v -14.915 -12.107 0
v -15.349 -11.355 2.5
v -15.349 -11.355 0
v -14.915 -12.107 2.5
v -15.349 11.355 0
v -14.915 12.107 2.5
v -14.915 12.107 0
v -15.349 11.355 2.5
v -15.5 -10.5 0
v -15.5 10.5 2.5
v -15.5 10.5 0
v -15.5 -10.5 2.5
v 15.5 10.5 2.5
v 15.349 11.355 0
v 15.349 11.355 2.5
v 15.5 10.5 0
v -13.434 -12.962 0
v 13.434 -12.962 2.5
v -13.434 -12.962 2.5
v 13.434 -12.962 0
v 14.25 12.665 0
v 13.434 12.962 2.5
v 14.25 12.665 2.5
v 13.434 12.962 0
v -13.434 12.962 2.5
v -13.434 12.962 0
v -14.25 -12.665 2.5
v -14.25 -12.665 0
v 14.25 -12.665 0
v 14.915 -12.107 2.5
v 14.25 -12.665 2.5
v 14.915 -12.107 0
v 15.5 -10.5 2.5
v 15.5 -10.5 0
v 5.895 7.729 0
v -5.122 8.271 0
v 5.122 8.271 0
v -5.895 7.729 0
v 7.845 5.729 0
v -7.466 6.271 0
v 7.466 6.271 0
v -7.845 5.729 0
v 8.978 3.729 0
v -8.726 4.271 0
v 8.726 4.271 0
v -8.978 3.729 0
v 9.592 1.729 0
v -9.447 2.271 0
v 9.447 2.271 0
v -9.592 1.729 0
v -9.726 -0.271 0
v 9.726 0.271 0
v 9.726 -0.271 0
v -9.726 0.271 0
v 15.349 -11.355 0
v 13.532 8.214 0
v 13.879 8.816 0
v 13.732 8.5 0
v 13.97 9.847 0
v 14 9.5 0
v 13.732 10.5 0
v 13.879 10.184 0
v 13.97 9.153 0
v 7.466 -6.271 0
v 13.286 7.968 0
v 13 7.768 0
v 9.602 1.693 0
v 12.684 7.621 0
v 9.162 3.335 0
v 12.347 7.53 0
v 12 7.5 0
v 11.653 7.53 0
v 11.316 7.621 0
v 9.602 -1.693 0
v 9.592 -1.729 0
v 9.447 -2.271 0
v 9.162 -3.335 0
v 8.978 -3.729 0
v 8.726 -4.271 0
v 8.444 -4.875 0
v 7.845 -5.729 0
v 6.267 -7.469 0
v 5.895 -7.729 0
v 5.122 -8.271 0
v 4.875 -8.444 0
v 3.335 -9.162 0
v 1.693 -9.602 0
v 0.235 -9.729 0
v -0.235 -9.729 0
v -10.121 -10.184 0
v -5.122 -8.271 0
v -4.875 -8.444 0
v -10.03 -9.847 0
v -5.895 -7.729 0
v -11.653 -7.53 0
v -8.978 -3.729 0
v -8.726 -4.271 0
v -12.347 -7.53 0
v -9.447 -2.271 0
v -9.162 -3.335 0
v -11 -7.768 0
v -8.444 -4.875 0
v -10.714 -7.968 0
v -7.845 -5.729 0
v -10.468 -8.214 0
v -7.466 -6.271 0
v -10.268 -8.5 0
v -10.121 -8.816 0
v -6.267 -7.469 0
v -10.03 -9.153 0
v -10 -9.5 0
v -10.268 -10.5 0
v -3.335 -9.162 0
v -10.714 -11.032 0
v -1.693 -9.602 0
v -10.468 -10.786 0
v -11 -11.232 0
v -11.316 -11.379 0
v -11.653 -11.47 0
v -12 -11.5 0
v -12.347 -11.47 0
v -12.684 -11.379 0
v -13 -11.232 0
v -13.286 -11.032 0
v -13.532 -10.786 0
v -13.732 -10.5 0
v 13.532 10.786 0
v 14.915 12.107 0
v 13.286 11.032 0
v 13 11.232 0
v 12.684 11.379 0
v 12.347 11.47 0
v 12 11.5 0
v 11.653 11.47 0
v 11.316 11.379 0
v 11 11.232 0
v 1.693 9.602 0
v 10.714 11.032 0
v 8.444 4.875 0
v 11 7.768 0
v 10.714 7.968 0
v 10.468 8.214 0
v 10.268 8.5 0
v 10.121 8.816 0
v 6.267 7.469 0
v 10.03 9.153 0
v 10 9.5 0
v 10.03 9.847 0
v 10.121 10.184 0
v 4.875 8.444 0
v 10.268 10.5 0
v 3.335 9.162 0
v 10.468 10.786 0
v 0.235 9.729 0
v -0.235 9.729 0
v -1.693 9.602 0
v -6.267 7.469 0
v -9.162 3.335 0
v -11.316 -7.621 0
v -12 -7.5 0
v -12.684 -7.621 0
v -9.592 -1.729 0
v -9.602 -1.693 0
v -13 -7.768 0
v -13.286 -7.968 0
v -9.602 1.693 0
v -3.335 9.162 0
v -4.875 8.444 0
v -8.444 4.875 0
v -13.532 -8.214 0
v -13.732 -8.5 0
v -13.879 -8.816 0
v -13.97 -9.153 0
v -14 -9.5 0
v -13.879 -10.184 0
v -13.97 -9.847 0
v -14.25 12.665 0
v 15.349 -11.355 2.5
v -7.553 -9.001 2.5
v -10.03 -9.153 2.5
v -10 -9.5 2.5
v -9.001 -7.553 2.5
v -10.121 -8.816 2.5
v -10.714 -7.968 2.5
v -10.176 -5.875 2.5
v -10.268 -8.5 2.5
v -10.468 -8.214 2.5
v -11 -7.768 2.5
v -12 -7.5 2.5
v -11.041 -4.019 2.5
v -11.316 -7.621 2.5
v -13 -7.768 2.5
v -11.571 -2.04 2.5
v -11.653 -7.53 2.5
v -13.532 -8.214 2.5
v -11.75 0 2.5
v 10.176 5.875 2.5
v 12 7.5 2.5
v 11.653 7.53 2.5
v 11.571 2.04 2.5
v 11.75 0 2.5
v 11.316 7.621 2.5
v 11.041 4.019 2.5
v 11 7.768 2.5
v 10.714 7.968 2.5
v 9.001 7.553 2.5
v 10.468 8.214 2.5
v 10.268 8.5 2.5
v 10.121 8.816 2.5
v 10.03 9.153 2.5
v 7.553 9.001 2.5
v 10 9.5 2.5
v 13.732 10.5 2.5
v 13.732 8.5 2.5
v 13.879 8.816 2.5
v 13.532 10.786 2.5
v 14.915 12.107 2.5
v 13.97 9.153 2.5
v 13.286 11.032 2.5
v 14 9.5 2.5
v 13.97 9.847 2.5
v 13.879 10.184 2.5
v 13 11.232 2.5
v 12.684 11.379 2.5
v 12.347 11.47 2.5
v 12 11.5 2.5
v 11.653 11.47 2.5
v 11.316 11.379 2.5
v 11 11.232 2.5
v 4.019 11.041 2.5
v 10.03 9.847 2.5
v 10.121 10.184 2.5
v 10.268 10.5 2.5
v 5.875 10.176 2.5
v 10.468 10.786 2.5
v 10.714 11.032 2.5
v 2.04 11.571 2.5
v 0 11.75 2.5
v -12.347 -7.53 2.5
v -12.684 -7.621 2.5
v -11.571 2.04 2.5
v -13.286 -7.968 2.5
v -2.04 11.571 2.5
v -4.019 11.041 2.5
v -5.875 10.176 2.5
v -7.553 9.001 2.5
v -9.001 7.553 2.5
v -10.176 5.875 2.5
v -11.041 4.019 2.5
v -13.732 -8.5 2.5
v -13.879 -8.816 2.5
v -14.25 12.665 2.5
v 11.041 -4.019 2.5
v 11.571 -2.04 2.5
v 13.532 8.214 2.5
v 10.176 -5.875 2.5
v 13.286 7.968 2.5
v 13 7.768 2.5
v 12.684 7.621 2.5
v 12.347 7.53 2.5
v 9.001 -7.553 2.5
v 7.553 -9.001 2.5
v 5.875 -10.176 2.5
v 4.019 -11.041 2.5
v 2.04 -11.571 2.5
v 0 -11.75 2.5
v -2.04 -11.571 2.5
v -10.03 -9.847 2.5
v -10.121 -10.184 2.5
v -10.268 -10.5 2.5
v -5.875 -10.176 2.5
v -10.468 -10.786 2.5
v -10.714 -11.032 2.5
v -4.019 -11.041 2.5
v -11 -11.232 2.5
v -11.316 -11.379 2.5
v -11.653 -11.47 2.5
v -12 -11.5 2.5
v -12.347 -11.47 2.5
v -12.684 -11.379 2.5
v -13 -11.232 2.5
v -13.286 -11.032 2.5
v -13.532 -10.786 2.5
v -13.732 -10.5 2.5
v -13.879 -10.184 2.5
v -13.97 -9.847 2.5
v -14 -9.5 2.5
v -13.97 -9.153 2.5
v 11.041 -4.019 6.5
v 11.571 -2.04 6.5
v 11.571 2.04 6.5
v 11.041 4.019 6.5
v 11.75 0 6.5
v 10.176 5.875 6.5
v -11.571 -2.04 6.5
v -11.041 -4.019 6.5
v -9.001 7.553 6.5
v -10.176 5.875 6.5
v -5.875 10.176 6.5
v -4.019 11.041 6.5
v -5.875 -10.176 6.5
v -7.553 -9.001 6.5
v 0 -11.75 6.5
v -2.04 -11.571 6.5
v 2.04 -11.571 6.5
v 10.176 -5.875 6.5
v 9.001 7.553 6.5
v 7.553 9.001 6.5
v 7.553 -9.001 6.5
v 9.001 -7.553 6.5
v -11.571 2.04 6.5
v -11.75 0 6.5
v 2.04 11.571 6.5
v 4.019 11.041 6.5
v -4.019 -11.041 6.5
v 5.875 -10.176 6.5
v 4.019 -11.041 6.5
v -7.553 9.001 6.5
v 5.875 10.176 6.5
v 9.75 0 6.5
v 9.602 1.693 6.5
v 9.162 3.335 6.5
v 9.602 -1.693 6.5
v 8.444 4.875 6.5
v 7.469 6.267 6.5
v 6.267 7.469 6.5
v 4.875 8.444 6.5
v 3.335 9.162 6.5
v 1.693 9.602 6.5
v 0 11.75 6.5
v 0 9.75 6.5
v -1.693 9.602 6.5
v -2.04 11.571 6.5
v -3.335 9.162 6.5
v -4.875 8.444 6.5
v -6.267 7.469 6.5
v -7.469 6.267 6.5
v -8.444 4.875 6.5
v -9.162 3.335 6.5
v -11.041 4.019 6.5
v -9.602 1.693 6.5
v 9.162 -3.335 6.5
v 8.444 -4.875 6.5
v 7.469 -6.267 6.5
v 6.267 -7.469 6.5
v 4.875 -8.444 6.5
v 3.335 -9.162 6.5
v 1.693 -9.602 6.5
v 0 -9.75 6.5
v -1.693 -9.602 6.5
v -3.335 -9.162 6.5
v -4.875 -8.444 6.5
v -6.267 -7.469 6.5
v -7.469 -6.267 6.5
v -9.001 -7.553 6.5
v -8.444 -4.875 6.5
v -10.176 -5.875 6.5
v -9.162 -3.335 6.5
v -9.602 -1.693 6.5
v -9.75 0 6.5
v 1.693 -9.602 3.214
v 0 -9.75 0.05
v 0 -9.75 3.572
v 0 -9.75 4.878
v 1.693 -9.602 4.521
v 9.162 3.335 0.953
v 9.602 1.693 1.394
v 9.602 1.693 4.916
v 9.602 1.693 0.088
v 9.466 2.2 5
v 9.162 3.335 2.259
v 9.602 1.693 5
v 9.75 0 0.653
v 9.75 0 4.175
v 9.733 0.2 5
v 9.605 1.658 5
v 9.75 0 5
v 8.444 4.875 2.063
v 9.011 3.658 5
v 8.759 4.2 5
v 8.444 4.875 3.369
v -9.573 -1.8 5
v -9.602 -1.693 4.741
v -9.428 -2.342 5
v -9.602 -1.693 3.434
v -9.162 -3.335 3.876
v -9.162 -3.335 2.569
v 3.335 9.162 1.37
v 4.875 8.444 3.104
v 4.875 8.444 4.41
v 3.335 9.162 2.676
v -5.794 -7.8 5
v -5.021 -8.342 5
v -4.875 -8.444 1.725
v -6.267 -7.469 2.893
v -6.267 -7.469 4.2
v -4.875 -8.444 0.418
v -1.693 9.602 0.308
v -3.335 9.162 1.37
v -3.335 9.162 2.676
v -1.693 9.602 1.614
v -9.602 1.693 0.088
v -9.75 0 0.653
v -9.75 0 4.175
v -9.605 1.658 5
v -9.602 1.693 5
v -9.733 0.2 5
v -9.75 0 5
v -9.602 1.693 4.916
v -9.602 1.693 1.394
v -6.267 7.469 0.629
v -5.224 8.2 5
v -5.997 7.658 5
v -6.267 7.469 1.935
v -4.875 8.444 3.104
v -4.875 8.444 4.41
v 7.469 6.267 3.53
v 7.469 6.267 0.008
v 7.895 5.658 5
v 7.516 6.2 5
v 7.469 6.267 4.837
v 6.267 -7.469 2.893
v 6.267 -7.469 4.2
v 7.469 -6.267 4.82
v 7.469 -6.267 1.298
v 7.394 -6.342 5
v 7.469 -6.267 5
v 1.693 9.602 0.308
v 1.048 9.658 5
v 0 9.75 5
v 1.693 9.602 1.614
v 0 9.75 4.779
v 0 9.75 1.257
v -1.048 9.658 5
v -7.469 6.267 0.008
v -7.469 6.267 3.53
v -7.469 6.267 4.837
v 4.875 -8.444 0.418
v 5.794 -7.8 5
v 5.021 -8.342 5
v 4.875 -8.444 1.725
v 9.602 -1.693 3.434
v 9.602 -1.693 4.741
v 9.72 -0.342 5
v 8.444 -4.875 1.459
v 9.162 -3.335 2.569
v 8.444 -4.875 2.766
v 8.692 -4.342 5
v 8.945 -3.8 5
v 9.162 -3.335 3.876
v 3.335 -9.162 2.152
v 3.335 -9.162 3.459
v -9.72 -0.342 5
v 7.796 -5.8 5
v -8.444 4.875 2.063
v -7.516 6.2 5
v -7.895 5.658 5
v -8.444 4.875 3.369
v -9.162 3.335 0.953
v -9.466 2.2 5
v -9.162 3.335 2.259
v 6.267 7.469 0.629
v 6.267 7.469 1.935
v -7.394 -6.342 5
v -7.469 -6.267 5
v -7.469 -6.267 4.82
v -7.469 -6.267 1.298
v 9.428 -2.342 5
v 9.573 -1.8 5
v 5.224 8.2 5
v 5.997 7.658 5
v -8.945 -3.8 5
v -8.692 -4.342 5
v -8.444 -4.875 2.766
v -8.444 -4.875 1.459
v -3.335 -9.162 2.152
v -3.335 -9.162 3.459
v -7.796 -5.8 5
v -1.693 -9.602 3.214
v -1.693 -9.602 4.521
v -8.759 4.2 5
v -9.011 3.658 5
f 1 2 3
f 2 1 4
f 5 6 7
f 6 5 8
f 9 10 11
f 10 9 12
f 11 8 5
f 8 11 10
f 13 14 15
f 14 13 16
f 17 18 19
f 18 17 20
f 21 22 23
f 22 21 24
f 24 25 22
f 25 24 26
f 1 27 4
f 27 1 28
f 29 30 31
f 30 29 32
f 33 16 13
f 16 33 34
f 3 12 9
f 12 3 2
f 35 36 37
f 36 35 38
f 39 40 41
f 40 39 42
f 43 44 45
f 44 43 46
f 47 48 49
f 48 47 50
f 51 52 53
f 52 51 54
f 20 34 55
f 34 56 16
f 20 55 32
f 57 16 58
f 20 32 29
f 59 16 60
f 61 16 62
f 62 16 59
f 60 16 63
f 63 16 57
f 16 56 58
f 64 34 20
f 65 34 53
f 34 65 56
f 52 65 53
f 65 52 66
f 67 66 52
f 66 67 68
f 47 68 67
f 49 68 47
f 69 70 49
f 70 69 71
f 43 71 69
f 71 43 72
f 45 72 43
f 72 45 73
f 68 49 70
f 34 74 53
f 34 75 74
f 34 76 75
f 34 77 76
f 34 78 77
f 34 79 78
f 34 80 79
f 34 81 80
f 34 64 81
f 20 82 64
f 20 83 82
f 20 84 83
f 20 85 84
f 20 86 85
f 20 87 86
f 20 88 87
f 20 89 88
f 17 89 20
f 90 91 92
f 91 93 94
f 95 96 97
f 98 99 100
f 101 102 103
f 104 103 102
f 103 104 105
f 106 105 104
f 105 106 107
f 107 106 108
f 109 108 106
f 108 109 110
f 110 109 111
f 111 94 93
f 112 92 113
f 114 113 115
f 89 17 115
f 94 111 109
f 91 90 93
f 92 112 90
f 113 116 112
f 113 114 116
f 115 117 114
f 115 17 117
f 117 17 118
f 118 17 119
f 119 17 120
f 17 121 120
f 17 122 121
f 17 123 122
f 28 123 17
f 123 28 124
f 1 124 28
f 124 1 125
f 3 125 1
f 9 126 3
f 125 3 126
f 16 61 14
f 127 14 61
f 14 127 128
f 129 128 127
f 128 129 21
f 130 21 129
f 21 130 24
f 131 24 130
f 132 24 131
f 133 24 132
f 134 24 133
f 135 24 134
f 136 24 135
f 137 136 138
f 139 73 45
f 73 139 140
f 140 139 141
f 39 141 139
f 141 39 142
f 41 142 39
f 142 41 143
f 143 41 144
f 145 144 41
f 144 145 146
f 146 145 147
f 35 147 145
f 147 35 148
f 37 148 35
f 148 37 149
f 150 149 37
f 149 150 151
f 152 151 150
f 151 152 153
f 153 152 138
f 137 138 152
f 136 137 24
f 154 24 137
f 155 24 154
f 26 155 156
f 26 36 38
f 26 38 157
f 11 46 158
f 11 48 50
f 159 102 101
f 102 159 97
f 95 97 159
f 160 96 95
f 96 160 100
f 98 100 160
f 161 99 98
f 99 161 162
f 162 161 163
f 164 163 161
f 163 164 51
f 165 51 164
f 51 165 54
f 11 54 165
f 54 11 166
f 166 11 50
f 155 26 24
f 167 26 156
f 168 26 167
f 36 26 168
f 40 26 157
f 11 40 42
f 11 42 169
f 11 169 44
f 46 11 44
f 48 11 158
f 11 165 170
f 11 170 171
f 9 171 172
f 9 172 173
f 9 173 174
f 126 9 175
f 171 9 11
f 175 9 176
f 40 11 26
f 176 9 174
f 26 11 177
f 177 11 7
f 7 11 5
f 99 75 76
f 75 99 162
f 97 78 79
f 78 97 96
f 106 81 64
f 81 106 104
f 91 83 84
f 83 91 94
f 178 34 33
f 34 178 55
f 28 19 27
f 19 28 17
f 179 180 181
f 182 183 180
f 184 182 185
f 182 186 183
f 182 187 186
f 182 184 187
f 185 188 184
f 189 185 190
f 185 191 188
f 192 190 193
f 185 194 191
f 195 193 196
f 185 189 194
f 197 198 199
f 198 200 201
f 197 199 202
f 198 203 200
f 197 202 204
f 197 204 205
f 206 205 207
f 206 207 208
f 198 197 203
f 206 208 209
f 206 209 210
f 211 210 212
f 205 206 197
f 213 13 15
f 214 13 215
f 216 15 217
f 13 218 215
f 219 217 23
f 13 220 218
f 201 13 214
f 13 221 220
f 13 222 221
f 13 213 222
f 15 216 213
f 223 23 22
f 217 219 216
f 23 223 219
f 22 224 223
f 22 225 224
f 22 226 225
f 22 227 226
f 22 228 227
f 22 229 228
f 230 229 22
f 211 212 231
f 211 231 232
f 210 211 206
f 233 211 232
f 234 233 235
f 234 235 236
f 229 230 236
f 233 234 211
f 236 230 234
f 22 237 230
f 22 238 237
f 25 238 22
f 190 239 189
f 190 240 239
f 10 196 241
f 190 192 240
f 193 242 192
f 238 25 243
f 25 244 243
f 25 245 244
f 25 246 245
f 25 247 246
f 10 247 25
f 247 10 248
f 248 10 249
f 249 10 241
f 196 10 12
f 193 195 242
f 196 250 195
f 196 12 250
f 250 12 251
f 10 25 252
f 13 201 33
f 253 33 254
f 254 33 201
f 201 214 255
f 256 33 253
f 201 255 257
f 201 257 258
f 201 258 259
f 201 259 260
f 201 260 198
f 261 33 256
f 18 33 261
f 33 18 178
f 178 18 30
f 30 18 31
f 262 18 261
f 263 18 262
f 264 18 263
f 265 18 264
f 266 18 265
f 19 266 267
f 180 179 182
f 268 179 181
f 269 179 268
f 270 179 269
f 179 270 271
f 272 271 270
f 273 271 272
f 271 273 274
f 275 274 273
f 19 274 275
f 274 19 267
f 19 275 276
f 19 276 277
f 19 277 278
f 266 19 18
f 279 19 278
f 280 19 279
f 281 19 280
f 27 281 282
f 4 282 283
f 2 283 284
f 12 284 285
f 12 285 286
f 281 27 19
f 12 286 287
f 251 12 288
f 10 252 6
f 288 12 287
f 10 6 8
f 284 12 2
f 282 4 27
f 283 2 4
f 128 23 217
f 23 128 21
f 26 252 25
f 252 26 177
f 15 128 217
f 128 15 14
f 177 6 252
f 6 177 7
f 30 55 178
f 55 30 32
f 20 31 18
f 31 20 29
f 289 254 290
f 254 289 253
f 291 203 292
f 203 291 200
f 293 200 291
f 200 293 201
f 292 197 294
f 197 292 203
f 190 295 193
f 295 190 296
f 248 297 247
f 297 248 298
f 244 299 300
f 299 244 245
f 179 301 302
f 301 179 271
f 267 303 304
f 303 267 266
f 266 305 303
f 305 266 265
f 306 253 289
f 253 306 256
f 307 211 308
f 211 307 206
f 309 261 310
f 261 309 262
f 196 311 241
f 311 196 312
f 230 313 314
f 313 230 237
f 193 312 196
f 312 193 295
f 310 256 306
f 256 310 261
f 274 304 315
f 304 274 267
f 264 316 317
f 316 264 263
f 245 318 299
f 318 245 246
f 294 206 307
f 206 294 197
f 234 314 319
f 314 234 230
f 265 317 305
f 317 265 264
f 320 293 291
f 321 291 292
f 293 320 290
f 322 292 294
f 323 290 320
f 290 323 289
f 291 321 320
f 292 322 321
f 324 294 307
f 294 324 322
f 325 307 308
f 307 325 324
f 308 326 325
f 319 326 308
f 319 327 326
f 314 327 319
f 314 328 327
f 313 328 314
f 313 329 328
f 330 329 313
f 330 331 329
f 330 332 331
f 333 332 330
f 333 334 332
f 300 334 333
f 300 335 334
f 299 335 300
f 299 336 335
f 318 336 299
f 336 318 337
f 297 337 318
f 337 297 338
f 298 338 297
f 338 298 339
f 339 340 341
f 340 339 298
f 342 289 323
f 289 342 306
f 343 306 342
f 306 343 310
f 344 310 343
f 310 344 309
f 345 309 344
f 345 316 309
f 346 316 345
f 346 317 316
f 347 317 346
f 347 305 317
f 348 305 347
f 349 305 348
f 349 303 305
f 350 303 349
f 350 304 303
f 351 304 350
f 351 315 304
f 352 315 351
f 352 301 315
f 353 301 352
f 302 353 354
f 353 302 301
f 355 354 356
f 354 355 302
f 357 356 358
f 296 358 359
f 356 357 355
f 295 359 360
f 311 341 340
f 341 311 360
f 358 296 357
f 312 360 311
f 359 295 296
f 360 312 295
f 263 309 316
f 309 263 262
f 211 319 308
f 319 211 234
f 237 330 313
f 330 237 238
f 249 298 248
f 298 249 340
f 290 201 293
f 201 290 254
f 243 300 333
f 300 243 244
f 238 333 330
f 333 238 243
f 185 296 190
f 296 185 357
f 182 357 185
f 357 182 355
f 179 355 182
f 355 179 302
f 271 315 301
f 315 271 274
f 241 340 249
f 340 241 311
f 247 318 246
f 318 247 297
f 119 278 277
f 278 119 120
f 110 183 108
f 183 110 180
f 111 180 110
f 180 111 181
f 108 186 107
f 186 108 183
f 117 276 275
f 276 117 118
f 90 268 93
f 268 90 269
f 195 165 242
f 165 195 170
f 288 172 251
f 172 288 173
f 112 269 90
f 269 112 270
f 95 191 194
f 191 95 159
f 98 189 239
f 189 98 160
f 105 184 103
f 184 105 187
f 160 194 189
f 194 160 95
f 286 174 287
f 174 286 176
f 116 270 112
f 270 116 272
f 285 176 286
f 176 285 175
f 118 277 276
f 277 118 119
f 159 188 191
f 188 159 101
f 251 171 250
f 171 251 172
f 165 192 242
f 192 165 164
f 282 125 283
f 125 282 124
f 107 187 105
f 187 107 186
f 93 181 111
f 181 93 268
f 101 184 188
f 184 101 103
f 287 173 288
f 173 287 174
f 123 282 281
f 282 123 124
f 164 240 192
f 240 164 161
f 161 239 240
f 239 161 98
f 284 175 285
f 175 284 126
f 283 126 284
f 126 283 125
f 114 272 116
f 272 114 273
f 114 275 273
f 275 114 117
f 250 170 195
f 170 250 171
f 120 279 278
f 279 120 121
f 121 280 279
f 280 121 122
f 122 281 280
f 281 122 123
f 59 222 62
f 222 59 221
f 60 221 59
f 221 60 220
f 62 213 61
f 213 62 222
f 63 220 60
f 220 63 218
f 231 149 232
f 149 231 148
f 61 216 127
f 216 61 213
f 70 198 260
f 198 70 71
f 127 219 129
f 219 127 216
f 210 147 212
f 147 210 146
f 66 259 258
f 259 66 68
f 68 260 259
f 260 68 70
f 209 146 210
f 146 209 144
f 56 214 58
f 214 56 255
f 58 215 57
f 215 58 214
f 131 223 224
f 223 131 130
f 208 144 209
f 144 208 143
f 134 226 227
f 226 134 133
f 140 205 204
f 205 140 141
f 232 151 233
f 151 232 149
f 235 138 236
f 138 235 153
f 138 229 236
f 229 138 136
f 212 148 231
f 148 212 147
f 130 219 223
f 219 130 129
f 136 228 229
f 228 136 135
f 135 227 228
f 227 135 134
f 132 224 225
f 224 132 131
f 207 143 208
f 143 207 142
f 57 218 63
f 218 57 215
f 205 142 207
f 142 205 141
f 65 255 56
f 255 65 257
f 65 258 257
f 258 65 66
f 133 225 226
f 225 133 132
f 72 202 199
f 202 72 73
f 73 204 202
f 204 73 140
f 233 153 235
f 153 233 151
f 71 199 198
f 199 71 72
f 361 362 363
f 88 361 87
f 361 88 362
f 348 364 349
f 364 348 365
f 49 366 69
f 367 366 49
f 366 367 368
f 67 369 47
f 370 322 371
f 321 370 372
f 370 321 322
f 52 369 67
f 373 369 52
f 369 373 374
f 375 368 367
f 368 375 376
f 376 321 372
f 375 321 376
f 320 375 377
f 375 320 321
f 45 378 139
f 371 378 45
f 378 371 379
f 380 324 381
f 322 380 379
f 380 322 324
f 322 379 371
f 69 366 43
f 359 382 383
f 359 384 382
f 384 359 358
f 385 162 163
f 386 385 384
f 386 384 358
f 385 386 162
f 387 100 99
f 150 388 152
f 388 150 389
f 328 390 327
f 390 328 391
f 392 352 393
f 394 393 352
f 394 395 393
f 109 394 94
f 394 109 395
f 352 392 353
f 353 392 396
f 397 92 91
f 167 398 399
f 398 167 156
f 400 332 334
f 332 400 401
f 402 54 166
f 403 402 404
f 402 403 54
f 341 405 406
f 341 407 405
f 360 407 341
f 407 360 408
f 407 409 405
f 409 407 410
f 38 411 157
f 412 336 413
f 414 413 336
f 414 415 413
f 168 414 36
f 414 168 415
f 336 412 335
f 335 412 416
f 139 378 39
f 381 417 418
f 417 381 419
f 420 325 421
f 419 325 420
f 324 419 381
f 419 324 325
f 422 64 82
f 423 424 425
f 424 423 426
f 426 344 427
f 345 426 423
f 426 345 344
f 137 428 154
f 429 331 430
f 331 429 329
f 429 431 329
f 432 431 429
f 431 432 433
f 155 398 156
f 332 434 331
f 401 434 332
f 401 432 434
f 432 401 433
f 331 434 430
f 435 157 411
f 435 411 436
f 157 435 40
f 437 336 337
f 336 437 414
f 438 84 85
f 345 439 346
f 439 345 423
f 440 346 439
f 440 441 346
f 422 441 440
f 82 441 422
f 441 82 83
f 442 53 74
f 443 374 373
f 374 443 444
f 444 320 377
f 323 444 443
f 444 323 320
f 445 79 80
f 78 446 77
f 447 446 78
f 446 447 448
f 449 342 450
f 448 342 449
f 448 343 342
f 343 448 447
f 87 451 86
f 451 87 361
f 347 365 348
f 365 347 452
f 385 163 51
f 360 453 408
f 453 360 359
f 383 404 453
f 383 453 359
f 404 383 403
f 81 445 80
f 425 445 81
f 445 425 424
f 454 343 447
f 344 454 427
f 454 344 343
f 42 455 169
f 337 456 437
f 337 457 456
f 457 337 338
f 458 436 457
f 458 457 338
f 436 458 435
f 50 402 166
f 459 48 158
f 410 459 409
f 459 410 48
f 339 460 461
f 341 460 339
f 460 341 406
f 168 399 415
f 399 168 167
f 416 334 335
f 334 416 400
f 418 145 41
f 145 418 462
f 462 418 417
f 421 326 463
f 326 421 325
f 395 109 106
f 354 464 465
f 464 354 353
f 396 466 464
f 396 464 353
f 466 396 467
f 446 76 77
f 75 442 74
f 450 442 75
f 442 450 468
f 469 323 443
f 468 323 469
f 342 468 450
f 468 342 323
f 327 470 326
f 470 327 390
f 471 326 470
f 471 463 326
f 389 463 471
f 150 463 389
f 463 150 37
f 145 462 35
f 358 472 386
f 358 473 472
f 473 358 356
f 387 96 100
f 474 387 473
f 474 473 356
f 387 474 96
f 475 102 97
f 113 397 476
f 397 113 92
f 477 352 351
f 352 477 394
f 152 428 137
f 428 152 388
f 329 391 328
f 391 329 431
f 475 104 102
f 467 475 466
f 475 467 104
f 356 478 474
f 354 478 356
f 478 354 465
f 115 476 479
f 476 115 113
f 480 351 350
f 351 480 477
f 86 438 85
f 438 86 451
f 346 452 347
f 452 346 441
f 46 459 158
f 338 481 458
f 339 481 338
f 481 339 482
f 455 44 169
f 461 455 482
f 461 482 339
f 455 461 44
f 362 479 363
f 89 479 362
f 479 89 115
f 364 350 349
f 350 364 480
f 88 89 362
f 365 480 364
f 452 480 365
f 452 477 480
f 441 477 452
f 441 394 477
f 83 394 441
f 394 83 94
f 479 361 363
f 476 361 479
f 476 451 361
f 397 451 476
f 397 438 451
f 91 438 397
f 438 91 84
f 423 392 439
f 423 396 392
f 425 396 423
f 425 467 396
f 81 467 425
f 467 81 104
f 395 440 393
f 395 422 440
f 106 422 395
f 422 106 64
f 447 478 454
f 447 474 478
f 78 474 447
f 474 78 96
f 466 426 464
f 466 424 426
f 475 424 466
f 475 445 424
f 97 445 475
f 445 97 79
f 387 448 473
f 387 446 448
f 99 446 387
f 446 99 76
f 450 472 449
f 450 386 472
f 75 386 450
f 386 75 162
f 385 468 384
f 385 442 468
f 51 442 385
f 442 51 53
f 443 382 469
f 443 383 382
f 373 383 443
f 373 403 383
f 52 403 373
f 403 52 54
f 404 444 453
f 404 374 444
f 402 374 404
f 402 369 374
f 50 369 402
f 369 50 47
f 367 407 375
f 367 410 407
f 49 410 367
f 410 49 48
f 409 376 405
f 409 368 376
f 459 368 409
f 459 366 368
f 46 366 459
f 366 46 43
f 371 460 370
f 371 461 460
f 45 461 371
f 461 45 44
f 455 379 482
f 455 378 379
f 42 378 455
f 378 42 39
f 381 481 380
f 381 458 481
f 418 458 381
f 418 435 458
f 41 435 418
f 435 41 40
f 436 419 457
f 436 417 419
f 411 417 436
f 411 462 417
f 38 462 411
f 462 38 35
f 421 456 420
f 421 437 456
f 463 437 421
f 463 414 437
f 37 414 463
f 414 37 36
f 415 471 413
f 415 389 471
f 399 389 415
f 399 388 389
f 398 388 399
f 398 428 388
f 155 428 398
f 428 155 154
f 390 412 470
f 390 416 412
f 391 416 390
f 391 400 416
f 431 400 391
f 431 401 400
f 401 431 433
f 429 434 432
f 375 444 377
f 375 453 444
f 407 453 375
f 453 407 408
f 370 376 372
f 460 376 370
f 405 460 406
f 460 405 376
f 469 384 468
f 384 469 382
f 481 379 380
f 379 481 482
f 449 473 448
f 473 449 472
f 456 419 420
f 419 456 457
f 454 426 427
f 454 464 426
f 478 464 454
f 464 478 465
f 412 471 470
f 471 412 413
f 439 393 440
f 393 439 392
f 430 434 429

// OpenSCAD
//usbMale(0);
//mirror([0,0,1]) usbBack(0);

vent(0);


module usbBack(holes) {
    difference() {
        union() {
            hull() for(i=[-1,1]) for(j=[-1,1]) 
                translate([(31-5)/2*i,(26-5)/2*j,0])
                cylinder(d=5,h=7,$fn=18);
        }
        for(i=[-1,1])
            translate([24/2*i,19/2*i,0]) 
            cylinder(d=4,h=30,$fn=36,center=true);
        cube([100,13.5,10],true);
    }
    if (holes==1)
        for(i=[-1,1])
        translate([24/2*i,19/2*i,0]) 
        cylinder(d=3.4,h=30,$fn=36,center=true);
}

module usbMale(holes) {
    difference() {
        union() {
            hull() for(i=[-1,1]) for(j=[-1,1]) 
                translate([(31-5)/2*i,(26-5)/2*j,0])
                cylinder(d=5,h=5,$fn=18);
            //translate([0,0,-10])cylinder(d=23.5,h=10);
            translate([0,0,5])cylinder(d=23.5,h=4);//h 2.5
        }
        for(i=[-1,1])
            translate([24/2*i,19/2*i,0]) 
            cylinder(d=4,h=30,$fn=36,center=true);
//        for(i=[-1,1])
//            translate([0,i*5,-12]) cube([14.5,6.5,100],true);
        for(i=[-1,1])
            translate([i*5,0,0]) 
            hull() {
                translate([0,0,0]) cube([6.8,14.4,30],true);
                
                //translate([0,0,-10]) cube([7,14.5,20],true);
            }
    }
    if (holes==1)
        for(i=[-1,1])
        translate([24/2*i,19/2*i,0]) 
        cylinder(d=3.4,h=30,$fn=36,center=true);
}

module vent(holes) {
    difference() {
        union() {
            hull() for(i=[-1,1]) for(j=[-1,1]) 
                translate([(31-5)/2*i,(26-5)/2*j,0])
                cylinder(d=5,h=2.5,$fn=18);
            //translate([0,0,-10])cylinder(d=23.5,h=10);
            translate([0,0,2.5])cylinder(d=23.5,h=4,$fn=36);//h 2.5

        }
        translate([0,0,2.5])cylinder(d=23.5-4,h=100,$fn=36,center=true);//h 2.5
        for(i=[-1,1])
            translate([24/2*i,19/2*i,0]) 
            cylinder(d=4,h=30,$fn=36,center=true);
//        for(i=[-1,1])
//            translate([0,i*5,-12]) cube([14.5,6.5,100],true);
//        for(i=[-1,1])
//            translate([i*5,0,0]) 
//            hull() {
//                translate([0,0,0]) cube([6.8,14.4,30],true);
//                
//                //translate([0,0,-10]) cube([7,14.5,20],true);
//            }
    }
    if (holes==1)
        for(i=[-1,1])
        translate([24/2*i,19/2*i,0]) 
        cylinder(d=3.4,h=30,$fn=36,center=true);
    intersection() {
        translate([0,0,0])cylinder(d=23.5,h=5,$fn=36);
        for(i=[-10:10])
            translate([0,i*2,0]) rotate([45/2,0,0]) cube([100,0.5,20],center=true);
    }
}
